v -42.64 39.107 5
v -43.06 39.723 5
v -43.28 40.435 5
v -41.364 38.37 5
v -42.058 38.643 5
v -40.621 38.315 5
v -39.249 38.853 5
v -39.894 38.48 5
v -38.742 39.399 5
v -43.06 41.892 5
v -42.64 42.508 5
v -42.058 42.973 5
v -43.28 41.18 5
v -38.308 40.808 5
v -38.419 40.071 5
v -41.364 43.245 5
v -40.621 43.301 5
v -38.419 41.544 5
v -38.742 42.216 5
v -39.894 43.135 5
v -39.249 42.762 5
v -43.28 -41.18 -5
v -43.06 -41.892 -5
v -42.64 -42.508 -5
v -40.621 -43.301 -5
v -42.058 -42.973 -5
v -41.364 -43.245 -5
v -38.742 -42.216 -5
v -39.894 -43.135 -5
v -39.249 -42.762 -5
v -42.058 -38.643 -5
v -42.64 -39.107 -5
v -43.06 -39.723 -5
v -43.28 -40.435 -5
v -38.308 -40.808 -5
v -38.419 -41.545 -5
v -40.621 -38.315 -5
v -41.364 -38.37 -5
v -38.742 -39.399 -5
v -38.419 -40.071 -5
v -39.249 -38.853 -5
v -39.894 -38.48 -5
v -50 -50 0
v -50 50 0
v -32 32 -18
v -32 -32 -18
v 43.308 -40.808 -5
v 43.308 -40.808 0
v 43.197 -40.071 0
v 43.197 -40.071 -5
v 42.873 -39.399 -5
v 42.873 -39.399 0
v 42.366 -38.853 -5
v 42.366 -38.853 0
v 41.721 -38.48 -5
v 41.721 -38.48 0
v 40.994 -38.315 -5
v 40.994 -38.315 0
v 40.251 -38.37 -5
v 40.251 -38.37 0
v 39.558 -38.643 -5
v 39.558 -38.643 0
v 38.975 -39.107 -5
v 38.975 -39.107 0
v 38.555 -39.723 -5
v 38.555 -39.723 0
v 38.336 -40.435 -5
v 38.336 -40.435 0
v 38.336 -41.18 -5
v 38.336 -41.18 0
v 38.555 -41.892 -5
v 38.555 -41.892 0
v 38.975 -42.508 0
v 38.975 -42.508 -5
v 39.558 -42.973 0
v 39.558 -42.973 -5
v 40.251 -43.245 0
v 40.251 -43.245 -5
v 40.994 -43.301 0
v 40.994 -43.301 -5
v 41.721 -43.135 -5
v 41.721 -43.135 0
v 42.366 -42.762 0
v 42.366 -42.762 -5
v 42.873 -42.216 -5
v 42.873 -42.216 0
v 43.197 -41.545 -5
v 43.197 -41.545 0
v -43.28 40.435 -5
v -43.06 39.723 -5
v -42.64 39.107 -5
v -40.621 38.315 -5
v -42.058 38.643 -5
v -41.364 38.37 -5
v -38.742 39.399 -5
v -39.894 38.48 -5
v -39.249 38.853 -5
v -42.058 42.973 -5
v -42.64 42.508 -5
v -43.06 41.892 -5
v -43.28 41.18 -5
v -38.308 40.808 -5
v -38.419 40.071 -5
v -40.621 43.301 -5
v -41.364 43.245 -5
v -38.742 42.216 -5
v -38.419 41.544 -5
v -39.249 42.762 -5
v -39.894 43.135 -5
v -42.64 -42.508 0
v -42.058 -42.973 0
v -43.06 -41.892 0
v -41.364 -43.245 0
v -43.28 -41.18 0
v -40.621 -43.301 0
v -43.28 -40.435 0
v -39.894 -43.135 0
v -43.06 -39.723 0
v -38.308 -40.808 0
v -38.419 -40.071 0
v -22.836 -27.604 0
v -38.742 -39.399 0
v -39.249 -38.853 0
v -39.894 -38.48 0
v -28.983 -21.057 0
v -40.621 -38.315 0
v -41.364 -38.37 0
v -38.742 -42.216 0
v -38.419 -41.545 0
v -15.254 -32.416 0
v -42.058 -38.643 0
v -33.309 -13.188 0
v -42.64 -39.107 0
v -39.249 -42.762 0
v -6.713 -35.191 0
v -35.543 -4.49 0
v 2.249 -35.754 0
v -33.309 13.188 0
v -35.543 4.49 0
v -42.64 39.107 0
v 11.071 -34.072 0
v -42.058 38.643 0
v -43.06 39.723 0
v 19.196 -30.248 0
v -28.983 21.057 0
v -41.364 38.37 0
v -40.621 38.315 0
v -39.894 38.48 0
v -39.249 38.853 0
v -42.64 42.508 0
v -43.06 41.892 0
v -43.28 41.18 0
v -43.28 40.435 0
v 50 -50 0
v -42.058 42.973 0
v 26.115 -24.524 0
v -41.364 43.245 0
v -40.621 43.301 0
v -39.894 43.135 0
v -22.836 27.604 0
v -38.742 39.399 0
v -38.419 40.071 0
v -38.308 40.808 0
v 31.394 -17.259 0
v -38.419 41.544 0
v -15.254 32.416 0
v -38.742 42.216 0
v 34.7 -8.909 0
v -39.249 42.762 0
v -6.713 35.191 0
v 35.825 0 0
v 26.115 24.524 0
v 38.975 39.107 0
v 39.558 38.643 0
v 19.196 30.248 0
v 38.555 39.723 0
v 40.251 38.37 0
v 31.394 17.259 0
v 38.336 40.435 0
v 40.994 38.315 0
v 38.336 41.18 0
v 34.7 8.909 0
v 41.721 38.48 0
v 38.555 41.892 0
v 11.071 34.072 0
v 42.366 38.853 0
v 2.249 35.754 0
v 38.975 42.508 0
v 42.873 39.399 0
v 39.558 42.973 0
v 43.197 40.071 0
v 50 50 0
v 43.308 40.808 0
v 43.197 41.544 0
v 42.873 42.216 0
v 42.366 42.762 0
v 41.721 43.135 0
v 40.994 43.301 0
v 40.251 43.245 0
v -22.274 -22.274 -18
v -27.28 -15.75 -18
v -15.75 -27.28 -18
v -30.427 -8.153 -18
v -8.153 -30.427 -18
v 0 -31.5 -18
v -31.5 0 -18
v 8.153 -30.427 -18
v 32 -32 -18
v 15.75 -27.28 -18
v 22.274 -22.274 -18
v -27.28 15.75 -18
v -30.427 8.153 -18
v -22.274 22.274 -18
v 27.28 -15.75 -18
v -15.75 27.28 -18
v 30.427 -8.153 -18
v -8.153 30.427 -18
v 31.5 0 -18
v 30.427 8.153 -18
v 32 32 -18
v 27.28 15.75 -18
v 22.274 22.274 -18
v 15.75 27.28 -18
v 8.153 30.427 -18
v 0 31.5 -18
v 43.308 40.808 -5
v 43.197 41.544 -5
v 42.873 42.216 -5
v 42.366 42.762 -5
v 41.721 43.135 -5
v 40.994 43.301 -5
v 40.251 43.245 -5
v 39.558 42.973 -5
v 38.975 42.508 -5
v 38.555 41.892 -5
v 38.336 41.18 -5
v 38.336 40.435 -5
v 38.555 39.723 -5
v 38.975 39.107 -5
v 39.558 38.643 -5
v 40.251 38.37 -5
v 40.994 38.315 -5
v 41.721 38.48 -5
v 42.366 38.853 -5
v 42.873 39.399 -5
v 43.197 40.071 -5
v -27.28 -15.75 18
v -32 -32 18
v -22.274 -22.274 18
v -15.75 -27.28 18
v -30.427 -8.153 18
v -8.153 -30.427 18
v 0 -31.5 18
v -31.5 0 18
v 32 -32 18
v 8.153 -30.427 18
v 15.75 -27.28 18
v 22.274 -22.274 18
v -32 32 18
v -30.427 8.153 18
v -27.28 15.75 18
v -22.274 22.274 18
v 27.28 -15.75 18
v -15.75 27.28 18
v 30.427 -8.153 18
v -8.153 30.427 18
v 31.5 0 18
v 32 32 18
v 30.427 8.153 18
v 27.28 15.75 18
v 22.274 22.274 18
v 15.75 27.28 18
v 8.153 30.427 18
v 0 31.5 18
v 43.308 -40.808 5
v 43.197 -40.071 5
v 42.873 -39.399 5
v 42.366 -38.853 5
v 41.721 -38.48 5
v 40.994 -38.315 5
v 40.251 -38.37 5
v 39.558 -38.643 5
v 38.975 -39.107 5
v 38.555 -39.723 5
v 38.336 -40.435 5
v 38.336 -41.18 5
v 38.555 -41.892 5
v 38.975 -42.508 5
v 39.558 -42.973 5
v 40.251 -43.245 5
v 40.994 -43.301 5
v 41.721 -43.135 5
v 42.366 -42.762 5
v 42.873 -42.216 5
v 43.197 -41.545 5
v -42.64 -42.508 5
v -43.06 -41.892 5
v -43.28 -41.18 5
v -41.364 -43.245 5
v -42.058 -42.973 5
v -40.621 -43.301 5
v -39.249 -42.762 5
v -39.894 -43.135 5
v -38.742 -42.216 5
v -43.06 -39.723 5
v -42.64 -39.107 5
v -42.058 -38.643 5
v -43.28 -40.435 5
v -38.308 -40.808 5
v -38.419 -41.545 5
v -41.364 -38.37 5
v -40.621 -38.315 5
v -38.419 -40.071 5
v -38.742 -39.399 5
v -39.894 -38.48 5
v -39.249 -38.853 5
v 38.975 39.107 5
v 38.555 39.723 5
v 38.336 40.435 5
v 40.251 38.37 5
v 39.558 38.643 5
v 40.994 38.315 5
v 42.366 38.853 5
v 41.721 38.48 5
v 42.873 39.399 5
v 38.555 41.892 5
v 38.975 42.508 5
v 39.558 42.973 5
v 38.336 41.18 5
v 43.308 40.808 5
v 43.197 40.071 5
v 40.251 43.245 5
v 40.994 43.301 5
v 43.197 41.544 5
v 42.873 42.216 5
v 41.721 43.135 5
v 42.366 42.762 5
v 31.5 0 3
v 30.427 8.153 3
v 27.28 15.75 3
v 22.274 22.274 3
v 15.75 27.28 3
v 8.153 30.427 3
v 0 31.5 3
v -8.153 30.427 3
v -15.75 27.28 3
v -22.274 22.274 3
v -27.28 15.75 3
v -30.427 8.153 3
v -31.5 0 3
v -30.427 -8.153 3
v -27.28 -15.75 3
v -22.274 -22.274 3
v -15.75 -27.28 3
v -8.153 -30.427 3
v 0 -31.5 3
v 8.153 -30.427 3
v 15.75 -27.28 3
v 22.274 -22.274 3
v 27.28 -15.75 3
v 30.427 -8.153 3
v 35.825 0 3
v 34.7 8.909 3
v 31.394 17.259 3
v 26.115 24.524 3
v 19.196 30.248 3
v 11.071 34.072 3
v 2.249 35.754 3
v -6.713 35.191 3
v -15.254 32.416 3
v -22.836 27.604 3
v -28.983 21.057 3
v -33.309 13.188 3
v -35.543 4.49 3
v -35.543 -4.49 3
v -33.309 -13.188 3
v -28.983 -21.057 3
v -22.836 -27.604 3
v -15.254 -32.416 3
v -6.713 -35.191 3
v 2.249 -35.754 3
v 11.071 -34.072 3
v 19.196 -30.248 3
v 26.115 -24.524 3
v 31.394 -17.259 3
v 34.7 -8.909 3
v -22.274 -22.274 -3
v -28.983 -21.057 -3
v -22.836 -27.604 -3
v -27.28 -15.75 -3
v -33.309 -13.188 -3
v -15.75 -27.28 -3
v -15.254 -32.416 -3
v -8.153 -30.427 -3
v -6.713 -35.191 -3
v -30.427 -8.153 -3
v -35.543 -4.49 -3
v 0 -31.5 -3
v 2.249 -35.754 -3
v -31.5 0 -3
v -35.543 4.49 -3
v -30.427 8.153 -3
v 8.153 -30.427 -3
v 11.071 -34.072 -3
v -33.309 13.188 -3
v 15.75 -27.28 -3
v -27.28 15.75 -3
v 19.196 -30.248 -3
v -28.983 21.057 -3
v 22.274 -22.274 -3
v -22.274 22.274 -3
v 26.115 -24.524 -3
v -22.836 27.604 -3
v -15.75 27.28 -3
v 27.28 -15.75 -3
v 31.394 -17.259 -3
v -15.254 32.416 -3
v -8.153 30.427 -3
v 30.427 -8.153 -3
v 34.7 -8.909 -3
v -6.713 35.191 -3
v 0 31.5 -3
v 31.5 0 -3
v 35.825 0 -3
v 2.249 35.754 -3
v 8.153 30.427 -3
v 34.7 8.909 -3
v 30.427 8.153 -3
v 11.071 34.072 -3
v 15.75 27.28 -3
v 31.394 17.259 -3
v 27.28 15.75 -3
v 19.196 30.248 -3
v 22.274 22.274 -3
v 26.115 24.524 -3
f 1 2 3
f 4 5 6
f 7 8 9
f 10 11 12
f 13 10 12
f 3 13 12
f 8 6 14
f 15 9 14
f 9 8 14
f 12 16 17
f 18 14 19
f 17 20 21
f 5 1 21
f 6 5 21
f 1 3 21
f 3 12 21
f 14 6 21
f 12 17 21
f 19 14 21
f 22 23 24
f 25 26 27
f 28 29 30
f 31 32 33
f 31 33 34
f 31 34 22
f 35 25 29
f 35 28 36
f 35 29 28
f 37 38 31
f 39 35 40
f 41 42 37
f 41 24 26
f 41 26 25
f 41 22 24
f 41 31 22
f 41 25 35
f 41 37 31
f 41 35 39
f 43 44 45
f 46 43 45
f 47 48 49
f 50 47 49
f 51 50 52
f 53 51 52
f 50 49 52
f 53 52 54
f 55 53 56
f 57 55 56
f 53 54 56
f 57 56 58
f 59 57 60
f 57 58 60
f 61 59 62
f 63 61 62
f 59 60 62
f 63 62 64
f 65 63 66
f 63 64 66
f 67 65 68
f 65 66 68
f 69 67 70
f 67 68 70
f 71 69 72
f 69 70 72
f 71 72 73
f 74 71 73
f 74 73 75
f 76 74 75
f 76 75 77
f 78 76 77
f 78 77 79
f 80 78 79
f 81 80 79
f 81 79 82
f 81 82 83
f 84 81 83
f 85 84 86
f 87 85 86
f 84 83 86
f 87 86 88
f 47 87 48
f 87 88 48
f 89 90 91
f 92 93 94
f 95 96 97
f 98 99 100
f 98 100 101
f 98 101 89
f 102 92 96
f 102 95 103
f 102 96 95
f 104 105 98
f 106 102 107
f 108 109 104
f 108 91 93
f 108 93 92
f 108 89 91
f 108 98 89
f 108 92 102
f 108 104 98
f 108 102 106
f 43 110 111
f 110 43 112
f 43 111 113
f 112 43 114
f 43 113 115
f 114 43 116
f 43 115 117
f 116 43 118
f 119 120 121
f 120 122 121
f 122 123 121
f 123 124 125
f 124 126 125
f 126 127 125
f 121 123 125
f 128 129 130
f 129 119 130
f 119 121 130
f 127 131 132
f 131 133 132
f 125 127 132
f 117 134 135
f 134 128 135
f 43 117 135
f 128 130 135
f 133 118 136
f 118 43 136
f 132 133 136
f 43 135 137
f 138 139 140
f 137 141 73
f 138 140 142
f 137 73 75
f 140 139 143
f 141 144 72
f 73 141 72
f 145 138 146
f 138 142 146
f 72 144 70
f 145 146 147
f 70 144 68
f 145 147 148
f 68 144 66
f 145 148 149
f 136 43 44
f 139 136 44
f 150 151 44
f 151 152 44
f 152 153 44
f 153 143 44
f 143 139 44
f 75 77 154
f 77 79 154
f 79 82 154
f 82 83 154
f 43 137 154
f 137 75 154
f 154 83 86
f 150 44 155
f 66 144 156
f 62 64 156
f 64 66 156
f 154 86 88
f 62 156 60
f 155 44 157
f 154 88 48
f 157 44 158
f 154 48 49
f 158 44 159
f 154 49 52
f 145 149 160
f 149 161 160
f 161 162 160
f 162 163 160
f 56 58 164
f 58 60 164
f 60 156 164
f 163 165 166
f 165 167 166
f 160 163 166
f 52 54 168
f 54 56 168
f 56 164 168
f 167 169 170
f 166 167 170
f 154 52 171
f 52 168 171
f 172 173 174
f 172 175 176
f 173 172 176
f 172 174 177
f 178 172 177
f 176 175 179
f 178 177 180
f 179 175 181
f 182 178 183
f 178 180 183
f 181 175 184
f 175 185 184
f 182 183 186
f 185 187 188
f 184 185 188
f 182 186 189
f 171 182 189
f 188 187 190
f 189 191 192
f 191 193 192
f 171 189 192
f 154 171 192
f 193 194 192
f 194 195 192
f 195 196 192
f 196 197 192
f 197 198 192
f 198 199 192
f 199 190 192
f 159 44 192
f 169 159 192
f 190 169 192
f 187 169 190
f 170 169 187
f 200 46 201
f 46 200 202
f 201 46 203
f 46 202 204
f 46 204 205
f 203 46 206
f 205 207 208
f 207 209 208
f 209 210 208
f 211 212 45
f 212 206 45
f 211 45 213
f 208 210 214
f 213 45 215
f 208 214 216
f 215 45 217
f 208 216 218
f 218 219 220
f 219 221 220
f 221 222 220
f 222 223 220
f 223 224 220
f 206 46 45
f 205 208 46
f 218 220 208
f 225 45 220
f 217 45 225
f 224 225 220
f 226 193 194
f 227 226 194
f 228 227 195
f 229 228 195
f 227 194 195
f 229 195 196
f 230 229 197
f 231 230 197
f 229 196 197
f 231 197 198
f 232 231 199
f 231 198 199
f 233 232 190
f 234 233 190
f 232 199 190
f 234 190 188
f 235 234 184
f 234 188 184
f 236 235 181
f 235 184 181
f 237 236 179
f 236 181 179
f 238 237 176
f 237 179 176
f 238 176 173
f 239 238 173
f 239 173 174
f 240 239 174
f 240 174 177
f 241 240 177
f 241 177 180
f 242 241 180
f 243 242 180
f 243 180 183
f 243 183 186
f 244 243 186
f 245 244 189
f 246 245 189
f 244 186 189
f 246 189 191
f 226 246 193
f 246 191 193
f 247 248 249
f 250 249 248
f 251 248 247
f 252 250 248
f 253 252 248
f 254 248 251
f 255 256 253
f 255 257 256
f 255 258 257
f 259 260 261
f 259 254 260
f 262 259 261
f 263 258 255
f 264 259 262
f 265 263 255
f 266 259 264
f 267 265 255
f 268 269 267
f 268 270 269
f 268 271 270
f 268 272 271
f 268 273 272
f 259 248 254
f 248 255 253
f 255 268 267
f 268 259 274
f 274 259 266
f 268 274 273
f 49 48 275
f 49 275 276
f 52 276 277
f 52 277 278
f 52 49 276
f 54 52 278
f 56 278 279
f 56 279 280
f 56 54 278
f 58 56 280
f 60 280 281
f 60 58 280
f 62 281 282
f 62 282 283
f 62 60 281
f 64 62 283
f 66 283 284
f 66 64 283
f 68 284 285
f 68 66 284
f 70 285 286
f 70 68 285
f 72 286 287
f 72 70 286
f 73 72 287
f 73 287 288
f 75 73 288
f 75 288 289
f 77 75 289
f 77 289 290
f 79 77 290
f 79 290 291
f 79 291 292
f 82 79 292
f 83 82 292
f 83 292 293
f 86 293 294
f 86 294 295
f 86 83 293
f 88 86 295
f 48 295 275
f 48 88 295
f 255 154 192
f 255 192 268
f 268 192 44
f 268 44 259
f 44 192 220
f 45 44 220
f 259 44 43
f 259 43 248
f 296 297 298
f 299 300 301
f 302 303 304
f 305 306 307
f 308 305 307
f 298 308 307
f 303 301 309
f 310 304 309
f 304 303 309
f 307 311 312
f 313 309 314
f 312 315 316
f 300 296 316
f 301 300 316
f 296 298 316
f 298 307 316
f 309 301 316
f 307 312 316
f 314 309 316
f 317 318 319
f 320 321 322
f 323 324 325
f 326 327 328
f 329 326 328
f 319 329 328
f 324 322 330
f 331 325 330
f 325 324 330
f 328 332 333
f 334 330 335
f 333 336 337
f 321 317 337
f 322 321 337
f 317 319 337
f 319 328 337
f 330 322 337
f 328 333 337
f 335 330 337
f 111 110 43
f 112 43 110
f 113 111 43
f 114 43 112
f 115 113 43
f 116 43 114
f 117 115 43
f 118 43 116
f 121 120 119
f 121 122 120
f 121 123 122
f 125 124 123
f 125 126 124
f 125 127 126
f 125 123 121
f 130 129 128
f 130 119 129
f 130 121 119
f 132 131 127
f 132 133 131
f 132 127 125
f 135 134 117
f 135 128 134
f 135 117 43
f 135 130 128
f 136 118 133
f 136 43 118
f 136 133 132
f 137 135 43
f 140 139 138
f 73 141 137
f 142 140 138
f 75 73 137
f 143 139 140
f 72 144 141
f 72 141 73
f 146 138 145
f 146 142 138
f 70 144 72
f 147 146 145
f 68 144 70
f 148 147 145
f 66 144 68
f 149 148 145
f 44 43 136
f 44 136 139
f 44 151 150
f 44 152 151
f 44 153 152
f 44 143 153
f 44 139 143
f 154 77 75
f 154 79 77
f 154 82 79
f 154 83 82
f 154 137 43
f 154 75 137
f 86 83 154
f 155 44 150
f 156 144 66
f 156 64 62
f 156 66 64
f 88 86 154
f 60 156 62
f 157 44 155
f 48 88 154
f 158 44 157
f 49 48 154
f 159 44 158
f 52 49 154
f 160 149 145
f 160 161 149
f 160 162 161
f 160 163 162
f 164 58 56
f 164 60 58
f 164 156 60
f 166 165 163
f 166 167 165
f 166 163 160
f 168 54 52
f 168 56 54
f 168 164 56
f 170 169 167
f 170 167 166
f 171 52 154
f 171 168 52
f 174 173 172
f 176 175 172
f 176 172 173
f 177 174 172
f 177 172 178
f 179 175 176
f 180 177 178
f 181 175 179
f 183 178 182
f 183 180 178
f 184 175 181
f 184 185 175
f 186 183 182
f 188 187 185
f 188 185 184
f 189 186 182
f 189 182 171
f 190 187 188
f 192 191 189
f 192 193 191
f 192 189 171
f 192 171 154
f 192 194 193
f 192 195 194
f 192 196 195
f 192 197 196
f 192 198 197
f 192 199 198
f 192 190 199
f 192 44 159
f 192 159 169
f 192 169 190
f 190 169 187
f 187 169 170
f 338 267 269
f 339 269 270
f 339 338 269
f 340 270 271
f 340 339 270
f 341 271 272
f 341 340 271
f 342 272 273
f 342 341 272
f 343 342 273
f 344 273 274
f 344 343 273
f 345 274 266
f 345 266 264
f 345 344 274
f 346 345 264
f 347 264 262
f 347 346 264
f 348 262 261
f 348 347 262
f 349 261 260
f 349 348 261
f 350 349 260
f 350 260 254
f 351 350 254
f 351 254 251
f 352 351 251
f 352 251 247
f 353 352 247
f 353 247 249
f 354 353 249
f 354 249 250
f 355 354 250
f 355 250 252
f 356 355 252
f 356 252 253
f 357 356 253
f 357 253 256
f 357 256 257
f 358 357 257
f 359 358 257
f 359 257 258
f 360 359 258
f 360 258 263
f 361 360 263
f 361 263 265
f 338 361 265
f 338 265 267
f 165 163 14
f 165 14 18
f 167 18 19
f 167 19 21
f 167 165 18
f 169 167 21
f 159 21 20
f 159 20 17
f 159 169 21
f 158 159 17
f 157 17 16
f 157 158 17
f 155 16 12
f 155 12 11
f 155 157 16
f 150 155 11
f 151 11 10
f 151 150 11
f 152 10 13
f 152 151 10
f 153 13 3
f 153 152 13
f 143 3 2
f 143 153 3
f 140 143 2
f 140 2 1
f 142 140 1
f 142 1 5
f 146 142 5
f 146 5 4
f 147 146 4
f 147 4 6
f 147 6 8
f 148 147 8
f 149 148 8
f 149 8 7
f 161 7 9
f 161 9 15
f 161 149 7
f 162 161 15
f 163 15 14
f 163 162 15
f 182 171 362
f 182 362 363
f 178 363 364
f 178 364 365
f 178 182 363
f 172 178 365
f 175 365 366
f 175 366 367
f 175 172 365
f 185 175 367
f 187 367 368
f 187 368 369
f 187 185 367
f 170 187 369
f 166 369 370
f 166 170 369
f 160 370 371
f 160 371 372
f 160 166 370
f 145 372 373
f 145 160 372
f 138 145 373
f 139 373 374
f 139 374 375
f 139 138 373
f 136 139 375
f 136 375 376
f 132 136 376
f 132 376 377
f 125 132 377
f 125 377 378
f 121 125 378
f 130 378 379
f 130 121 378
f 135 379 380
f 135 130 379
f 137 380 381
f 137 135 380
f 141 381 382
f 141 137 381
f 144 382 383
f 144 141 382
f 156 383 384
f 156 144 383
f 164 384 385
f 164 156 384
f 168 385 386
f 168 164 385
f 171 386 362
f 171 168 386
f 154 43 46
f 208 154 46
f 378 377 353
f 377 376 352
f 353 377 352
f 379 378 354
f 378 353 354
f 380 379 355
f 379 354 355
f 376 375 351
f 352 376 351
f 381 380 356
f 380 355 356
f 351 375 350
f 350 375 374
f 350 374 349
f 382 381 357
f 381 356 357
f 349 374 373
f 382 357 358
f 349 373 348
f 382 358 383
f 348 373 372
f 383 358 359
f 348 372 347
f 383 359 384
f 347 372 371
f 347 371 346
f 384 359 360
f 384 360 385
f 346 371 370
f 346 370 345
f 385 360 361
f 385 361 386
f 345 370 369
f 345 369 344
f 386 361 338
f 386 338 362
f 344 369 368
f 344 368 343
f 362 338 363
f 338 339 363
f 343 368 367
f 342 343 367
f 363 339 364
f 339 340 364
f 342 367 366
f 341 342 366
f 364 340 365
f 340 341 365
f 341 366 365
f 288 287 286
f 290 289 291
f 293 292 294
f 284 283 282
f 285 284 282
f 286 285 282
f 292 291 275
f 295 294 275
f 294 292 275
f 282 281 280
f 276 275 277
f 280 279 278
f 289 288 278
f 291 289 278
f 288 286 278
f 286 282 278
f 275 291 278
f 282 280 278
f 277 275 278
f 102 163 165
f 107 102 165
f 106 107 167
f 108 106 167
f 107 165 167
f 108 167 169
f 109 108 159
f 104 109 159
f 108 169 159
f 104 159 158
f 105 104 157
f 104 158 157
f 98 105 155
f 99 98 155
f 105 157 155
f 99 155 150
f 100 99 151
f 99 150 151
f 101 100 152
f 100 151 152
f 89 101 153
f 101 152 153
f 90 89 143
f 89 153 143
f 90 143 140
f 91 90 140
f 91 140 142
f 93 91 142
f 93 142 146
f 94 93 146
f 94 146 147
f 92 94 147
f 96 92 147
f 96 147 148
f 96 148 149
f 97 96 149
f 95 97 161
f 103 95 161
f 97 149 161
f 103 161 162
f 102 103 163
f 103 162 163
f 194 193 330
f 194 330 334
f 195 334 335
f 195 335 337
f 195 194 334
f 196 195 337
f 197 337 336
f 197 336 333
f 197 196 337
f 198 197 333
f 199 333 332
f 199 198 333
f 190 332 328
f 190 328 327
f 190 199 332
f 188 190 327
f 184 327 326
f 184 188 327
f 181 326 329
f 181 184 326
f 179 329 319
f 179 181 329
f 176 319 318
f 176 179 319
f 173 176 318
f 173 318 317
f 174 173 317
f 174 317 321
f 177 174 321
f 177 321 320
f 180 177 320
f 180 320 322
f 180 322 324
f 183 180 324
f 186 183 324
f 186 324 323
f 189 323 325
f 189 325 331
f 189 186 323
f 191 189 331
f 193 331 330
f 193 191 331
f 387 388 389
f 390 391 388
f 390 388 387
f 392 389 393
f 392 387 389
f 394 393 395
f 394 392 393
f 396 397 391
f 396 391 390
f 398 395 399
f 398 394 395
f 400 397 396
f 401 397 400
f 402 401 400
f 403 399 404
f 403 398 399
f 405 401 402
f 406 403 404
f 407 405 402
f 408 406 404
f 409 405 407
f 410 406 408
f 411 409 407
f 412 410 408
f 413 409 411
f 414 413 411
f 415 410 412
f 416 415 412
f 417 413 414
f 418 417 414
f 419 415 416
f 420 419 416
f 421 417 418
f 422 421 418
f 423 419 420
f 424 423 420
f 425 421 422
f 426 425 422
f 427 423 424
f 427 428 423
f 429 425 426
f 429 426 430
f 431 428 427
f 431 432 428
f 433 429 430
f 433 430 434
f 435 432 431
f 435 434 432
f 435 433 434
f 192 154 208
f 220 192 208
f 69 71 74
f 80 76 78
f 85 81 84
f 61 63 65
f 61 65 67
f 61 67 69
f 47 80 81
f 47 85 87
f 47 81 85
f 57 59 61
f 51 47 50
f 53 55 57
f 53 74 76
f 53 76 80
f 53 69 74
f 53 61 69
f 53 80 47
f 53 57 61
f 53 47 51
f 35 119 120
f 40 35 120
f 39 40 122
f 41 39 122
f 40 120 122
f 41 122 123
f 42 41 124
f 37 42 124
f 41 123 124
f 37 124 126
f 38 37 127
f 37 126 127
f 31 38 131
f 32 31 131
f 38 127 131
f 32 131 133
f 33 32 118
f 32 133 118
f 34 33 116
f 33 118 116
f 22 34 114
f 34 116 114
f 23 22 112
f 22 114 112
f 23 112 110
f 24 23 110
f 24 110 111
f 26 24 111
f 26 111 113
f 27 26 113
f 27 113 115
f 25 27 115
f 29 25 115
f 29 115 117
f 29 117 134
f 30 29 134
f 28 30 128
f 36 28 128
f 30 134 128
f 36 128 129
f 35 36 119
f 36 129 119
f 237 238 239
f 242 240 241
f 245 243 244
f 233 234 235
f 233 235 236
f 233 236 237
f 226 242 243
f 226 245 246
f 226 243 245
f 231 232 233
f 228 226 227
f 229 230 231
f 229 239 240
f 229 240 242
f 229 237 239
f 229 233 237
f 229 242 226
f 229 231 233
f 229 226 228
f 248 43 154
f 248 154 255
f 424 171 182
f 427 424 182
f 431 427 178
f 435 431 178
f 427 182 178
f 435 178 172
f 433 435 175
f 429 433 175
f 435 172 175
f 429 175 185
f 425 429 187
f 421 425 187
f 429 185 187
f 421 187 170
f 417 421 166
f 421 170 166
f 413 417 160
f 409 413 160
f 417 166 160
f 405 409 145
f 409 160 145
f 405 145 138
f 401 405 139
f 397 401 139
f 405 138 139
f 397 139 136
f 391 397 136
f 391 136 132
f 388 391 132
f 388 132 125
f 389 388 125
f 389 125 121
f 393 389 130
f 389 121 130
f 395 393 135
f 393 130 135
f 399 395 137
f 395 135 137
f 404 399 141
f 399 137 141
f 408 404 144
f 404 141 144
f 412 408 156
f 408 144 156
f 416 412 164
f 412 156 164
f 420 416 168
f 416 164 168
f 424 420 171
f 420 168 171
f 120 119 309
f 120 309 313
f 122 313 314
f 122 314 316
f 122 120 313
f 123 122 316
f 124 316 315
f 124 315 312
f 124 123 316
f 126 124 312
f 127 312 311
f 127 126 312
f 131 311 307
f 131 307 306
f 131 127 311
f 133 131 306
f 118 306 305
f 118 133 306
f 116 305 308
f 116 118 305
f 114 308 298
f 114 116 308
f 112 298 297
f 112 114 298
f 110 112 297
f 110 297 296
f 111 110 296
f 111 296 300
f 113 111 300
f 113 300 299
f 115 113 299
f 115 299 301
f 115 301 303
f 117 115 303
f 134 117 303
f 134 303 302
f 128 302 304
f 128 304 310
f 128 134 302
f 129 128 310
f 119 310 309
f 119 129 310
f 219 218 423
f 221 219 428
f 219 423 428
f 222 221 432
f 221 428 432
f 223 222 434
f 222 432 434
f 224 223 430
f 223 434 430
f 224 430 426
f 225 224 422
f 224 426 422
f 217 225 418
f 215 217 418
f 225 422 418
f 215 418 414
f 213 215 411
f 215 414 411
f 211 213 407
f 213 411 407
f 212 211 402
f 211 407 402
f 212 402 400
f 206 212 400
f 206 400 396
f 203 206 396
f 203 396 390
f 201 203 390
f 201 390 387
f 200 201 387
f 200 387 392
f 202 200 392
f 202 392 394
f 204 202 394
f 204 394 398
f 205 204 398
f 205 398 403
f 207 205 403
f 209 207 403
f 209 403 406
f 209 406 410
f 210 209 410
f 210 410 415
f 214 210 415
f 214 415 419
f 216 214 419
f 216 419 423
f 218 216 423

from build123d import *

# Parameters (mm, degrees)
F0_W     = 100
F0_H     = 100
F1_DEPTH = 18
F1_TAPER = 45
F2_R     = 31.5
F3_DEPTH = 18
F4_R     = 35.825122357
F5_DEPTH = 3
F6_R     = 2.5
F7_DEPTH = 5


with BuildPart() as f1:
    # F0 (on Top) → F1 (new body)
    with BuildSketch(Plane.XY):
        Rectangle(F0_W, F0_H)
    extrude(amount=F1_DEPTH, taper=F1_TAPER)

    # F2 (on Top) → F3 (cut)
    with BuildSketch(Plane.XY):
        Circle(F2_R)
    extrude(amount=F3_DEPTH, mode=Mode.SUBTRACT)

    # F4 (on Top) → F5 (cut)
    with BuildSketch(Plane.XY):
        Circle(F4_R)
    extrude(amount=F5_DEPTH, mode=Mode.SUBTRACT)

    # F6 (on Top) → F7 (cut)
    with BuildSketch(Plane.XY):
        with Locations((-40.8076118446, 40.8076118446)):
            Circle(F6_R)
        with Locations((-40.8076118446, -40.8076141554)):
            Circle(F6_R)
        with Locations((40.8076141554, 40.8076118446)):
            Circle(F6_R)
        with Locations((40.8076141554, -40.8076141554)):
            Circle(F6_R)
    extrude(amount=F7_DEPTH, mode=Mode.SUBTRACT)


with BuildPart() as f8_1:
    # F8: instance of F1
    add(f1.part.mirror(Plane.XY))


solid = Compound([f1.part, f8_1.part])
